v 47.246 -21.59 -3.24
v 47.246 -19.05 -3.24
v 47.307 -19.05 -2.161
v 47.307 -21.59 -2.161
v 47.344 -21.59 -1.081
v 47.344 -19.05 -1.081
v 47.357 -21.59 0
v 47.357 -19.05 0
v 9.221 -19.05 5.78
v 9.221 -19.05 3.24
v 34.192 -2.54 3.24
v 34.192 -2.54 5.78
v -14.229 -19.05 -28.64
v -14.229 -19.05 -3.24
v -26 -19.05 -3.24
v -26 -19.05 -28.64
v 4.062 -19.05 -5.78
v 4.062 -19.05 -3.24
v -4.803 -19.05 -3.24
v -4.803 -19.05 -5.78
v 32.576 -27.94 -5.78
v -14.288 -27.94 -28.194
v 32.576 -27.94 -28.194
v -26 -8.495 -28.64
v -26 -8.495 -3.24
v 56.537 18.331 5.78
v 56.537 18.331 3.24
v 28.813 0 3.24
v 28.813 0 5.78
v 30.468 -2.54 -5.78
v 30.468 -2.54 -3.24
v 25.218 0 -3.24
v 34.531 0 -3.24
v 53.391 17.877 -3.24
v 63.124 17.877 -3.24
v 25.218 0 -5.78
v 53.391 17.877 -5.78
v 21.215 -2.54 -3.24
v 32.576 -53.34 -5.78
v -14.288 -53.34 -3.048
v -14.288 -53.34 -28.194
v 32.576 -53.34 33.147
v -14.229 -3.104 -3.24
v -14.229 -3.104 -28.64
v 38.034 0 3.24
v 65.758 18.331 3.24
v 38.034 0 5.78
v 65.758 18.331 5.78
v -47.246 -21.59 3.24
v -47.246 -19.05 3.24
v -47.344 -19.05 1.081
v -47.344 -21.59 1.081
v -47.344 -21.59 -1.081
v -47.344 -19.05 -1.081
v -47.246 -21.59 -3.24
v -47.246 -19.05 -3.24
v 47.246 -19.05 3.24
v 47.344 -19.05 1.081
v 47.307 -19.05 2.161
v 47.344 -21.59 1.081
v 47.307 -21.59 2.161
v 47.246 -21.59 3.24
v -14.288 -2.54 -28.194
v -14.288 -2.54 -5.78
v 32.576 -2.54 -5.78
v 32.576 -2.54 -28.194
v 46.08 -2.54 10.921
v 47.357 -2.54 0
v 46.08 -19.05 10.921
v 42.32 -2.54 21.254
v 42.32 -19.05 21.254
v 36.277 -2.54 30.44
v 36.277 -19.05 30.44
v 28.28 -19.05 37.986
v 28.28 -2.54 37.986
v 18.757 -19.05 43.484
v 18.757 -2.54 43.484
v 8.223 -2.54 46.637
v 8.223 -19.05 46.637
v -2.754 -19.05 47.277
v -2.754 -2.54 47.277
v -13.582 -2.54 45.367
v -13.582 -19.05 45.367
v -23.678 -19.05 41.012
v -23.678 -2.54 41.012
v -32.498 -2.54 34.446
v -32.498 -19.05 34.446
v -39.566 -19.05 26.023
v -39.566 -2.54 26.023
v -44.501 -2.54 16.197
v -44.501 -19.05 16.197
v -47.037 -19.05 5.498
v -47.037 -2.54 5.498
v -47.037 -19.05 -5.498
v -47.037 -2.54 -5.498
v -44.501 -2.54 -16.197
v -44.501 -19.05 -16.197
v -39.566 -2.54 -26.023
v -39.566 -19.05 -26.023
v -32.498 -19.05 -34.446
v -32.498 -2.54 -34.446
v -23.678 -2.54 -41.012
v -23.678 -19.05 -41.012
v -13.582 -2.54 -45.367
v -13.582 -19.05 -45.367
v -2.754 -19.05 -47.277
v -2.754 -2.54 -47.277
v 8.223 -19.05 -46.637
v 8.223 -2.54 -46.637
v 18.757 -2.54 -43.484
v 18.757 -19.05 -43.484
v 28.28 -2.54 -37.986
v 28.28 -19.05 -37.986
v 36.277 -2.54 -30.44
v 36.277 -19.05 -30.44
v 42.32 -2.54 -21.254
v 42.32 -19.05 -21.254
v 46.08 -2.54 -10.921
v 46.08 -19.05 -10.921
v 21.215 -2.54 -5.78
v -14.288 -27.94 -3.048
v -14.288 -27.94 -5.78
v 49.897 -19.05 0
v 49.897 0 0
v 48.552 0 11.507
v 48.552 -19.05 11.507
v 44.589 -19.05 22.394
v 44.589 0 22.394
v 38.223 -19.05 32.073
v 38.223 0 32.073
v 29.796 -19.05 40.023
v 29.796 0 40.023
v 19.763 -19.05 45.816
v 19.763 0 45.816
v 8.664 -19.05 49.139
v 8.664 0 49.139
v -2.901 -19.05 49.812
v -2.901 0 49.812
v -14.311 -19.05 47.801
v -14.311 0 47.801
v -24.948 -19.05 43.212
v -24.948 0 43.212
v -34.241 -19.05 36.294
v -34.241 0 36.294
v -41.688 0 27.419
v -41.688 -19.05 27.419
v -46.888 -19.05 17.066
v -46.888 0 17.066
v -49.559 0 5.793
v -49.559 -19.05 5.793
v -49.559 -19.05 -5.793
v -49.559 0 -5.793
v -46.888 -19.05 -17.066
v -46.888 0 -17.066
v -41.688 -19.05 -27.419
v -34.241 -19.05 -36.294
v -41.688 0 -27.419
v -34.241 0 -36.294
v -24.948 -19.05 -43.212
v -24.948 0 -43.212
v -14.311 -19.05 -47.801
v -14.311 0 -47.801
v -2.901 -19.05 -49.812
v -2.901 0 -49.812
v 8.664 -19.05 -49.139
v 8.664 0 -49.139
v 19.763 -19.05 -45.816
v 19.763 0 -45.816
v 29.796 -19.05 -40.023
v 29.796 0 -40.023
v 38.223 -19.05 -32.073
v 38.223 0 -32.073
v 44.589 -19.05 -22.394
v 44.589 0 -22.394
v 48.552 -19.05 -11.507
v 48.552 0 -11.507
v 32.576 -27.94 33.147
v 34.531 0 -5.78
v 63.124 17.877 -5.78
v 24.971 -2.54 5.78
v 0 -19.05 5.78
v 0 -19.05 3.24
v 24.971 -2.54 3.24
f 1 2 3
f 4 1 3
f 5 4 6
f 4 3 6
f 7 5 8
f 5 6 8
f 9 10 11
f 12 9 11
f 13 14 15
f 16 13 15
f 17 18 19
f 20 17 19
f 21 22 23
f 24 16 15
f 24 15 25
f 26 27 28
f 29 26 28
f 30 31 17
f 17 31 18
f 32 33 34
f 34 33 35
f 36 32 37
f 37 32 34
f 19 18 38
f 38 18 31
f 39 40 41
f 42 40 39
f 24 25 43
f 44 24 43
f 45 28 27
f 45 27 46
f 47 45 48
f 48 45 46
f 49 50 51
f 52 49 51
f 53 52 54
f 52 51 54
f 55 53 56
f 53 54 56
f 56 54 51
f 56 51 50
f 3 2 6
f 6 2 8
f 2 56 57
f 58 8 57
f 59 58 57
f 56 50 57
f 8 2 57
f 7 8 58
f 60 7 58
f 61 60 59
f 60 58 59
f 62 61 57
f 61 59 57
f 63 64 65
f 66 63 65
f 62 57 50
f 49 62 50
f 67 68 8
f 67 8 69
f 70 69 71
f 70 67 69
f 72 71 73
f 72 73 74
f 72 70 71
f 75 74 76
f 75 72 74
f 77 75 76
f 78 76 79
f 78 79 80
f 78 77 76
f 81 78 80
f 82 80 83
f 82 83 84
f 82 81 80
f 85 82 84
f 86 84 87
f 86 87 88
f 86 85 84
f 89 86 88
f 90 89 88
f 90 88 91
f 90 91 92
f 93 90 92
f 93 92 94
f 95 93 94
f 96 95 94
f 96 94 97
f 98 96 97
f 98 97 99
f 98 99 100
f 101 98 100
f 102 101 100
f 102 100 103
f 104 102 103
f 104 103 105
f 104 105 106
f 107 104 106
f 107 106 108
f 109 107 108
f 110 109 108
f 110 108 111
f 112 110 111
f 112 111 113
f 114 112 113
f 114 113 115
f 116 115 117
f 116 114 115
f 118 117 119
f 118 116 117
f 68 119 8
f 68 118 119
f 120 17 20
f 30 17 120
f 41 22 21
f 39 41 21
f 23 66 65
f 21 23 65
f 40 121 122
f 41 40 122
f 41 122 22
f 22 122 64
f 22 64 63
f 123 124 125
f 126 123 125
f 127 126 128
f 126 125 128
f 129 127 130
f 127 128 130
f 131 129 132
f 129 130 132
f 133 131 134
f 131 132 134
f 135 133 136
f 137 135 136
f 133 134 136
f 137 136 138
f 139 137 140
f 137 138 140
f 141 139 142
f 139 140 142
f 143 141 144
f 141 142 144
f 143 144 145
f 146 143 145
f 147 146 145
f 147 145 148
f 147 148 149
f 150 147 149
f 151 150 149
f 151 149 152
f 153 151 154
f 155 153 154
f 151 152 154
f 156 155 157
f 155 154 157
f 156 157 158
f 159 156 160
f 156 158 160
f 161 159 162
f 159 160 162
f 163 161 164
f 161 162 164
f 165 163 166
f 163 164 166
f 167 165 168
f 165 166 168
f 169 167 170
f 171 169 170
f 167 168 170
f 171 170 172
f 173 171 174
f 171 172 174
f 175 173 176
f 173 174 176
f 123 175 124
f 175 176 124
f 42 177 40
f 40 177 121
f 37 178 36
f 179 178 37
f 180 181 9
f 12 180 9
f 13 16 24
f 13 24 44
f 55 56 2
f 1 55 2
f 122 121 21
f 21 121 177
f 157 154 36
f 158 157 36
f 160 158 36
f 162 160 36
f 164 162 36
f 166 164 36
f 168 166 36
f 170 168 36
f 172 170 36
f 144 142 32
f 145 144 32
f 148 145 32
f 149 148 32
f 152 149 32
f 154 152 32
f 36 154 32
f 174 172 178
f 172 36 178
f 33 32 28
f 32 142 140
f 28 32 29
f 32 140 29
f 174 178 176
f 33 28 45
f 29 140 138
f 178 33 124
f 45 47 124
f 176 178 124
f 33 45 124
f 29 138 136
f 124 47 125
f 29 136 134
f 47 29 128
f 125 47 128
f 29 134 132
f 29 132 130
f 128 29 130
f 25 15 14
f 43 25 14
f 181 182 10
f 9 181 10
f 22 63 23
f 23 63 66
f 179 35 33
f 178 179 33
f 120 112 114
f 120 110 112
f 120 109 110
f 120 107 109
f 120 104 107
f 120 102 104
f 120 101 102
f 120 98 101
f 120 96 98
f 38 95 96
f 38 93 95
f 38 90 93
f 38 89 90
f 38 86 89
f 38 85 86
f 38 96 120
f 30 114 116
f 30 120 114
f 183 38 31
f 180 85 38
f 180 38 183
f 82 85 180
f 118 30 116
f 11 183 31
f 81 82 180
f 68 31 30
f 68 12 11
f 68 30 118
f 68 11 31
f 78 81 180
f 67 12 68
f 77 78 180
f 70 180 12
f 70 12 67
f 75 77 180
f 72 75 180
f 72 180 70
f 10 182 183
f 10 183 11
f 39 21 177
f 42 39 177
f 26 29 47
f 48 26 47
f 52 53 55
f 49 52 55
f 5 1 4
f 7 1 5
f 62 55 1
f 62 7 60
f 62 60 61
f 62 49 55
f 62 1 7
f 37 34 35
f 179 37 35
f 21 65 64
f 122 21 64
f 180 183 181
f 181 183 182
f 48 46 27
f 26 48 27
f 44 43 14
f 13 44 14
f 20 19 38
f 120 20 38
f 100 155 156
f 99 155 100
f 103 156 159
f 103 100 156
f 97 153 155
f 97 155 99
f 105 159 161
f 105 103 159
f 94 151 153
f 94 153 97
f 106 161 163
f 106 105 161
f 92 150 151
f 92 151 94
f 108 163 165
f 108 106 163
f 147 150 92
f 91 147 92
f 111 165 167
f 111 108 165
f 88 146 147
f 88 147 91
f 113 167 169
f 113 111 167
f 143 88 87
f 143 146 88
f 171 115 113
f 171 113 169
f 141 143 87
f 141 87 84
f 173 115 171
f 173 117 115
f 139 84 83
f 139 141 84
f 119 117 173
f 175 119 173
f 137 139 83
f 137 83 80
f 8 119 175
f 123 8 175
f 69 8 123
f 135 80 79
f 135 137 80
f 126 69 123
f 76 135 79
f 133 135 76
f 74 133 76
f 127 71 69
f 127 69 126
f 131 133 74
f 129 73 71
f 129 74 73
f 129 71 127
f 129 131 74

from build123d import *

# Parameters (mm, degrees)
F0_R      = 49.8968196512
F1_DEPTH  = 19.05
F2_T      = -2.54
F4_DEPTH  = 2.54
F6_DEPTH  = 2.54
F8_DEPTH  = 2.54
F12_DEPTH = 25.4
F14_DEPTH = 25.4
F16_DEPTH = 25.4


# Not quite as in the source:
# - a feature of the source that left no trace in its solid (it failed there, or was rolled back) is left out


with BuildPart() as f1:
    # F0 (on Front) → F1 (new body)
    with BuildSketch(Plane.XZ):
        Circle(F0_R)
    extrude(amount=F1_DEPTH)

    # F2
    f2_openings = [f1.faces().sort_by_distance(p)[0] for p in [
        (0, -19.05, 0),
    ]]
    offset(amount=F2_T, openings=f2_openings)

    # F5 (on face) → F6 (join)
    with BuildSketch(Plane.XY.offset(3.2400222074)):
        Polygon((56.5371960402, 18.3305814862), (0, -19.05), (9.2212408781, -19.05), (65.7584369183, 18.3305814862), align=None)
    extrude(amount=F6_DEPTH)

    # F7 (on face) → F8 (join)
    with BuildSketch(Plane(origin=(0, 0, -3.2400222074), x_dir=(1, 0, 0), z_dir=(0, 0, -1))):
        Polygon((4.062458419, 19.05), (-4.8034556786, 19.05), (53.3914454281, -17.8773459047), (63.1237998605, -17.8773459047), align=None)
    extrude(amount=F8_DEPTH)


with BuildPart() as f4:
    # F3 (on face) → F4 (new body)
    with BuildSketch(Plane.XZ.offset(19.05)):
        with BuildLine():
            Line((47.2458529775, 3.2400222074), (-47.2458529775, 3.2400222074))
            ThreePointArc((-47.2458529775, 3.2400222074), (-47.3568196512, 0), (-47.2458529775, -3.2400222074))
            Line((-47.2458529775, -3.2400222074), (47.2458529775, -3.2400222074))
            ThreePointArc((47.2458529775, -3.2400222074), (47.3290698525, -1.6209609424), (47.3568196512, 0))
            ThreePointArc((47.3568196512, 0), (47.3290698525, 1.6209609424), (47.2458529775, 3.2400222074))
        make_face()
    extrude(amount=F4_DEPTH)


with BuildPart() as f12:
    # F11 (on face) → F12 (new body)
    with BuildSketch(Plane(origin=(0, 0, -3.2400222074), x_dir=(1, 0, 0), z_dir=(0, 0, -1))):
        Polygon((-14.2288124189, 19.05), (-25.9999446571, 19.05), (-25.9999446571, 8.4945941344), (-14.2288124189, 3.1038702), align=None)
    extrude(amount=F12_DEPTH)


with BuildPart() as f14:
    # F13 (on face) → F14 (new body)
    with BuildSketch(Plane.XZ.offset(2.54)):
        Polygon((-14.2875006422, -5.7800222074), (-14.2875006422, -28.1940009445), (32.5755029917, -28.1940009445), (32.5755029917, -5.7800222074), (30.4684381424, -5.7800222074), (21.2151436476, -5.7800222074), align=None)
    extrude(amount=F14_DEPTH)

    # F15 (on face) → F16 (join)
    with BuildSketch(Plane.XZ.offset(27.94)):
        Polygon((-14.2875006422, -5.7800222074), (-14.2875006422, -28.1940009445), (32.5755029917, -5.7800222074), align=None)
        Polygon((-14.2875006422, -3.0480003916), (-14.2875006422, -5.7800222074), (32.5755029917, -5.7800222074), (32.5755029917, 33.1469997764), align=None)
    extrude(amount=F16_DEPTH)


solid = Compound([f1.part, f4.part, f12.part, f14.part])
